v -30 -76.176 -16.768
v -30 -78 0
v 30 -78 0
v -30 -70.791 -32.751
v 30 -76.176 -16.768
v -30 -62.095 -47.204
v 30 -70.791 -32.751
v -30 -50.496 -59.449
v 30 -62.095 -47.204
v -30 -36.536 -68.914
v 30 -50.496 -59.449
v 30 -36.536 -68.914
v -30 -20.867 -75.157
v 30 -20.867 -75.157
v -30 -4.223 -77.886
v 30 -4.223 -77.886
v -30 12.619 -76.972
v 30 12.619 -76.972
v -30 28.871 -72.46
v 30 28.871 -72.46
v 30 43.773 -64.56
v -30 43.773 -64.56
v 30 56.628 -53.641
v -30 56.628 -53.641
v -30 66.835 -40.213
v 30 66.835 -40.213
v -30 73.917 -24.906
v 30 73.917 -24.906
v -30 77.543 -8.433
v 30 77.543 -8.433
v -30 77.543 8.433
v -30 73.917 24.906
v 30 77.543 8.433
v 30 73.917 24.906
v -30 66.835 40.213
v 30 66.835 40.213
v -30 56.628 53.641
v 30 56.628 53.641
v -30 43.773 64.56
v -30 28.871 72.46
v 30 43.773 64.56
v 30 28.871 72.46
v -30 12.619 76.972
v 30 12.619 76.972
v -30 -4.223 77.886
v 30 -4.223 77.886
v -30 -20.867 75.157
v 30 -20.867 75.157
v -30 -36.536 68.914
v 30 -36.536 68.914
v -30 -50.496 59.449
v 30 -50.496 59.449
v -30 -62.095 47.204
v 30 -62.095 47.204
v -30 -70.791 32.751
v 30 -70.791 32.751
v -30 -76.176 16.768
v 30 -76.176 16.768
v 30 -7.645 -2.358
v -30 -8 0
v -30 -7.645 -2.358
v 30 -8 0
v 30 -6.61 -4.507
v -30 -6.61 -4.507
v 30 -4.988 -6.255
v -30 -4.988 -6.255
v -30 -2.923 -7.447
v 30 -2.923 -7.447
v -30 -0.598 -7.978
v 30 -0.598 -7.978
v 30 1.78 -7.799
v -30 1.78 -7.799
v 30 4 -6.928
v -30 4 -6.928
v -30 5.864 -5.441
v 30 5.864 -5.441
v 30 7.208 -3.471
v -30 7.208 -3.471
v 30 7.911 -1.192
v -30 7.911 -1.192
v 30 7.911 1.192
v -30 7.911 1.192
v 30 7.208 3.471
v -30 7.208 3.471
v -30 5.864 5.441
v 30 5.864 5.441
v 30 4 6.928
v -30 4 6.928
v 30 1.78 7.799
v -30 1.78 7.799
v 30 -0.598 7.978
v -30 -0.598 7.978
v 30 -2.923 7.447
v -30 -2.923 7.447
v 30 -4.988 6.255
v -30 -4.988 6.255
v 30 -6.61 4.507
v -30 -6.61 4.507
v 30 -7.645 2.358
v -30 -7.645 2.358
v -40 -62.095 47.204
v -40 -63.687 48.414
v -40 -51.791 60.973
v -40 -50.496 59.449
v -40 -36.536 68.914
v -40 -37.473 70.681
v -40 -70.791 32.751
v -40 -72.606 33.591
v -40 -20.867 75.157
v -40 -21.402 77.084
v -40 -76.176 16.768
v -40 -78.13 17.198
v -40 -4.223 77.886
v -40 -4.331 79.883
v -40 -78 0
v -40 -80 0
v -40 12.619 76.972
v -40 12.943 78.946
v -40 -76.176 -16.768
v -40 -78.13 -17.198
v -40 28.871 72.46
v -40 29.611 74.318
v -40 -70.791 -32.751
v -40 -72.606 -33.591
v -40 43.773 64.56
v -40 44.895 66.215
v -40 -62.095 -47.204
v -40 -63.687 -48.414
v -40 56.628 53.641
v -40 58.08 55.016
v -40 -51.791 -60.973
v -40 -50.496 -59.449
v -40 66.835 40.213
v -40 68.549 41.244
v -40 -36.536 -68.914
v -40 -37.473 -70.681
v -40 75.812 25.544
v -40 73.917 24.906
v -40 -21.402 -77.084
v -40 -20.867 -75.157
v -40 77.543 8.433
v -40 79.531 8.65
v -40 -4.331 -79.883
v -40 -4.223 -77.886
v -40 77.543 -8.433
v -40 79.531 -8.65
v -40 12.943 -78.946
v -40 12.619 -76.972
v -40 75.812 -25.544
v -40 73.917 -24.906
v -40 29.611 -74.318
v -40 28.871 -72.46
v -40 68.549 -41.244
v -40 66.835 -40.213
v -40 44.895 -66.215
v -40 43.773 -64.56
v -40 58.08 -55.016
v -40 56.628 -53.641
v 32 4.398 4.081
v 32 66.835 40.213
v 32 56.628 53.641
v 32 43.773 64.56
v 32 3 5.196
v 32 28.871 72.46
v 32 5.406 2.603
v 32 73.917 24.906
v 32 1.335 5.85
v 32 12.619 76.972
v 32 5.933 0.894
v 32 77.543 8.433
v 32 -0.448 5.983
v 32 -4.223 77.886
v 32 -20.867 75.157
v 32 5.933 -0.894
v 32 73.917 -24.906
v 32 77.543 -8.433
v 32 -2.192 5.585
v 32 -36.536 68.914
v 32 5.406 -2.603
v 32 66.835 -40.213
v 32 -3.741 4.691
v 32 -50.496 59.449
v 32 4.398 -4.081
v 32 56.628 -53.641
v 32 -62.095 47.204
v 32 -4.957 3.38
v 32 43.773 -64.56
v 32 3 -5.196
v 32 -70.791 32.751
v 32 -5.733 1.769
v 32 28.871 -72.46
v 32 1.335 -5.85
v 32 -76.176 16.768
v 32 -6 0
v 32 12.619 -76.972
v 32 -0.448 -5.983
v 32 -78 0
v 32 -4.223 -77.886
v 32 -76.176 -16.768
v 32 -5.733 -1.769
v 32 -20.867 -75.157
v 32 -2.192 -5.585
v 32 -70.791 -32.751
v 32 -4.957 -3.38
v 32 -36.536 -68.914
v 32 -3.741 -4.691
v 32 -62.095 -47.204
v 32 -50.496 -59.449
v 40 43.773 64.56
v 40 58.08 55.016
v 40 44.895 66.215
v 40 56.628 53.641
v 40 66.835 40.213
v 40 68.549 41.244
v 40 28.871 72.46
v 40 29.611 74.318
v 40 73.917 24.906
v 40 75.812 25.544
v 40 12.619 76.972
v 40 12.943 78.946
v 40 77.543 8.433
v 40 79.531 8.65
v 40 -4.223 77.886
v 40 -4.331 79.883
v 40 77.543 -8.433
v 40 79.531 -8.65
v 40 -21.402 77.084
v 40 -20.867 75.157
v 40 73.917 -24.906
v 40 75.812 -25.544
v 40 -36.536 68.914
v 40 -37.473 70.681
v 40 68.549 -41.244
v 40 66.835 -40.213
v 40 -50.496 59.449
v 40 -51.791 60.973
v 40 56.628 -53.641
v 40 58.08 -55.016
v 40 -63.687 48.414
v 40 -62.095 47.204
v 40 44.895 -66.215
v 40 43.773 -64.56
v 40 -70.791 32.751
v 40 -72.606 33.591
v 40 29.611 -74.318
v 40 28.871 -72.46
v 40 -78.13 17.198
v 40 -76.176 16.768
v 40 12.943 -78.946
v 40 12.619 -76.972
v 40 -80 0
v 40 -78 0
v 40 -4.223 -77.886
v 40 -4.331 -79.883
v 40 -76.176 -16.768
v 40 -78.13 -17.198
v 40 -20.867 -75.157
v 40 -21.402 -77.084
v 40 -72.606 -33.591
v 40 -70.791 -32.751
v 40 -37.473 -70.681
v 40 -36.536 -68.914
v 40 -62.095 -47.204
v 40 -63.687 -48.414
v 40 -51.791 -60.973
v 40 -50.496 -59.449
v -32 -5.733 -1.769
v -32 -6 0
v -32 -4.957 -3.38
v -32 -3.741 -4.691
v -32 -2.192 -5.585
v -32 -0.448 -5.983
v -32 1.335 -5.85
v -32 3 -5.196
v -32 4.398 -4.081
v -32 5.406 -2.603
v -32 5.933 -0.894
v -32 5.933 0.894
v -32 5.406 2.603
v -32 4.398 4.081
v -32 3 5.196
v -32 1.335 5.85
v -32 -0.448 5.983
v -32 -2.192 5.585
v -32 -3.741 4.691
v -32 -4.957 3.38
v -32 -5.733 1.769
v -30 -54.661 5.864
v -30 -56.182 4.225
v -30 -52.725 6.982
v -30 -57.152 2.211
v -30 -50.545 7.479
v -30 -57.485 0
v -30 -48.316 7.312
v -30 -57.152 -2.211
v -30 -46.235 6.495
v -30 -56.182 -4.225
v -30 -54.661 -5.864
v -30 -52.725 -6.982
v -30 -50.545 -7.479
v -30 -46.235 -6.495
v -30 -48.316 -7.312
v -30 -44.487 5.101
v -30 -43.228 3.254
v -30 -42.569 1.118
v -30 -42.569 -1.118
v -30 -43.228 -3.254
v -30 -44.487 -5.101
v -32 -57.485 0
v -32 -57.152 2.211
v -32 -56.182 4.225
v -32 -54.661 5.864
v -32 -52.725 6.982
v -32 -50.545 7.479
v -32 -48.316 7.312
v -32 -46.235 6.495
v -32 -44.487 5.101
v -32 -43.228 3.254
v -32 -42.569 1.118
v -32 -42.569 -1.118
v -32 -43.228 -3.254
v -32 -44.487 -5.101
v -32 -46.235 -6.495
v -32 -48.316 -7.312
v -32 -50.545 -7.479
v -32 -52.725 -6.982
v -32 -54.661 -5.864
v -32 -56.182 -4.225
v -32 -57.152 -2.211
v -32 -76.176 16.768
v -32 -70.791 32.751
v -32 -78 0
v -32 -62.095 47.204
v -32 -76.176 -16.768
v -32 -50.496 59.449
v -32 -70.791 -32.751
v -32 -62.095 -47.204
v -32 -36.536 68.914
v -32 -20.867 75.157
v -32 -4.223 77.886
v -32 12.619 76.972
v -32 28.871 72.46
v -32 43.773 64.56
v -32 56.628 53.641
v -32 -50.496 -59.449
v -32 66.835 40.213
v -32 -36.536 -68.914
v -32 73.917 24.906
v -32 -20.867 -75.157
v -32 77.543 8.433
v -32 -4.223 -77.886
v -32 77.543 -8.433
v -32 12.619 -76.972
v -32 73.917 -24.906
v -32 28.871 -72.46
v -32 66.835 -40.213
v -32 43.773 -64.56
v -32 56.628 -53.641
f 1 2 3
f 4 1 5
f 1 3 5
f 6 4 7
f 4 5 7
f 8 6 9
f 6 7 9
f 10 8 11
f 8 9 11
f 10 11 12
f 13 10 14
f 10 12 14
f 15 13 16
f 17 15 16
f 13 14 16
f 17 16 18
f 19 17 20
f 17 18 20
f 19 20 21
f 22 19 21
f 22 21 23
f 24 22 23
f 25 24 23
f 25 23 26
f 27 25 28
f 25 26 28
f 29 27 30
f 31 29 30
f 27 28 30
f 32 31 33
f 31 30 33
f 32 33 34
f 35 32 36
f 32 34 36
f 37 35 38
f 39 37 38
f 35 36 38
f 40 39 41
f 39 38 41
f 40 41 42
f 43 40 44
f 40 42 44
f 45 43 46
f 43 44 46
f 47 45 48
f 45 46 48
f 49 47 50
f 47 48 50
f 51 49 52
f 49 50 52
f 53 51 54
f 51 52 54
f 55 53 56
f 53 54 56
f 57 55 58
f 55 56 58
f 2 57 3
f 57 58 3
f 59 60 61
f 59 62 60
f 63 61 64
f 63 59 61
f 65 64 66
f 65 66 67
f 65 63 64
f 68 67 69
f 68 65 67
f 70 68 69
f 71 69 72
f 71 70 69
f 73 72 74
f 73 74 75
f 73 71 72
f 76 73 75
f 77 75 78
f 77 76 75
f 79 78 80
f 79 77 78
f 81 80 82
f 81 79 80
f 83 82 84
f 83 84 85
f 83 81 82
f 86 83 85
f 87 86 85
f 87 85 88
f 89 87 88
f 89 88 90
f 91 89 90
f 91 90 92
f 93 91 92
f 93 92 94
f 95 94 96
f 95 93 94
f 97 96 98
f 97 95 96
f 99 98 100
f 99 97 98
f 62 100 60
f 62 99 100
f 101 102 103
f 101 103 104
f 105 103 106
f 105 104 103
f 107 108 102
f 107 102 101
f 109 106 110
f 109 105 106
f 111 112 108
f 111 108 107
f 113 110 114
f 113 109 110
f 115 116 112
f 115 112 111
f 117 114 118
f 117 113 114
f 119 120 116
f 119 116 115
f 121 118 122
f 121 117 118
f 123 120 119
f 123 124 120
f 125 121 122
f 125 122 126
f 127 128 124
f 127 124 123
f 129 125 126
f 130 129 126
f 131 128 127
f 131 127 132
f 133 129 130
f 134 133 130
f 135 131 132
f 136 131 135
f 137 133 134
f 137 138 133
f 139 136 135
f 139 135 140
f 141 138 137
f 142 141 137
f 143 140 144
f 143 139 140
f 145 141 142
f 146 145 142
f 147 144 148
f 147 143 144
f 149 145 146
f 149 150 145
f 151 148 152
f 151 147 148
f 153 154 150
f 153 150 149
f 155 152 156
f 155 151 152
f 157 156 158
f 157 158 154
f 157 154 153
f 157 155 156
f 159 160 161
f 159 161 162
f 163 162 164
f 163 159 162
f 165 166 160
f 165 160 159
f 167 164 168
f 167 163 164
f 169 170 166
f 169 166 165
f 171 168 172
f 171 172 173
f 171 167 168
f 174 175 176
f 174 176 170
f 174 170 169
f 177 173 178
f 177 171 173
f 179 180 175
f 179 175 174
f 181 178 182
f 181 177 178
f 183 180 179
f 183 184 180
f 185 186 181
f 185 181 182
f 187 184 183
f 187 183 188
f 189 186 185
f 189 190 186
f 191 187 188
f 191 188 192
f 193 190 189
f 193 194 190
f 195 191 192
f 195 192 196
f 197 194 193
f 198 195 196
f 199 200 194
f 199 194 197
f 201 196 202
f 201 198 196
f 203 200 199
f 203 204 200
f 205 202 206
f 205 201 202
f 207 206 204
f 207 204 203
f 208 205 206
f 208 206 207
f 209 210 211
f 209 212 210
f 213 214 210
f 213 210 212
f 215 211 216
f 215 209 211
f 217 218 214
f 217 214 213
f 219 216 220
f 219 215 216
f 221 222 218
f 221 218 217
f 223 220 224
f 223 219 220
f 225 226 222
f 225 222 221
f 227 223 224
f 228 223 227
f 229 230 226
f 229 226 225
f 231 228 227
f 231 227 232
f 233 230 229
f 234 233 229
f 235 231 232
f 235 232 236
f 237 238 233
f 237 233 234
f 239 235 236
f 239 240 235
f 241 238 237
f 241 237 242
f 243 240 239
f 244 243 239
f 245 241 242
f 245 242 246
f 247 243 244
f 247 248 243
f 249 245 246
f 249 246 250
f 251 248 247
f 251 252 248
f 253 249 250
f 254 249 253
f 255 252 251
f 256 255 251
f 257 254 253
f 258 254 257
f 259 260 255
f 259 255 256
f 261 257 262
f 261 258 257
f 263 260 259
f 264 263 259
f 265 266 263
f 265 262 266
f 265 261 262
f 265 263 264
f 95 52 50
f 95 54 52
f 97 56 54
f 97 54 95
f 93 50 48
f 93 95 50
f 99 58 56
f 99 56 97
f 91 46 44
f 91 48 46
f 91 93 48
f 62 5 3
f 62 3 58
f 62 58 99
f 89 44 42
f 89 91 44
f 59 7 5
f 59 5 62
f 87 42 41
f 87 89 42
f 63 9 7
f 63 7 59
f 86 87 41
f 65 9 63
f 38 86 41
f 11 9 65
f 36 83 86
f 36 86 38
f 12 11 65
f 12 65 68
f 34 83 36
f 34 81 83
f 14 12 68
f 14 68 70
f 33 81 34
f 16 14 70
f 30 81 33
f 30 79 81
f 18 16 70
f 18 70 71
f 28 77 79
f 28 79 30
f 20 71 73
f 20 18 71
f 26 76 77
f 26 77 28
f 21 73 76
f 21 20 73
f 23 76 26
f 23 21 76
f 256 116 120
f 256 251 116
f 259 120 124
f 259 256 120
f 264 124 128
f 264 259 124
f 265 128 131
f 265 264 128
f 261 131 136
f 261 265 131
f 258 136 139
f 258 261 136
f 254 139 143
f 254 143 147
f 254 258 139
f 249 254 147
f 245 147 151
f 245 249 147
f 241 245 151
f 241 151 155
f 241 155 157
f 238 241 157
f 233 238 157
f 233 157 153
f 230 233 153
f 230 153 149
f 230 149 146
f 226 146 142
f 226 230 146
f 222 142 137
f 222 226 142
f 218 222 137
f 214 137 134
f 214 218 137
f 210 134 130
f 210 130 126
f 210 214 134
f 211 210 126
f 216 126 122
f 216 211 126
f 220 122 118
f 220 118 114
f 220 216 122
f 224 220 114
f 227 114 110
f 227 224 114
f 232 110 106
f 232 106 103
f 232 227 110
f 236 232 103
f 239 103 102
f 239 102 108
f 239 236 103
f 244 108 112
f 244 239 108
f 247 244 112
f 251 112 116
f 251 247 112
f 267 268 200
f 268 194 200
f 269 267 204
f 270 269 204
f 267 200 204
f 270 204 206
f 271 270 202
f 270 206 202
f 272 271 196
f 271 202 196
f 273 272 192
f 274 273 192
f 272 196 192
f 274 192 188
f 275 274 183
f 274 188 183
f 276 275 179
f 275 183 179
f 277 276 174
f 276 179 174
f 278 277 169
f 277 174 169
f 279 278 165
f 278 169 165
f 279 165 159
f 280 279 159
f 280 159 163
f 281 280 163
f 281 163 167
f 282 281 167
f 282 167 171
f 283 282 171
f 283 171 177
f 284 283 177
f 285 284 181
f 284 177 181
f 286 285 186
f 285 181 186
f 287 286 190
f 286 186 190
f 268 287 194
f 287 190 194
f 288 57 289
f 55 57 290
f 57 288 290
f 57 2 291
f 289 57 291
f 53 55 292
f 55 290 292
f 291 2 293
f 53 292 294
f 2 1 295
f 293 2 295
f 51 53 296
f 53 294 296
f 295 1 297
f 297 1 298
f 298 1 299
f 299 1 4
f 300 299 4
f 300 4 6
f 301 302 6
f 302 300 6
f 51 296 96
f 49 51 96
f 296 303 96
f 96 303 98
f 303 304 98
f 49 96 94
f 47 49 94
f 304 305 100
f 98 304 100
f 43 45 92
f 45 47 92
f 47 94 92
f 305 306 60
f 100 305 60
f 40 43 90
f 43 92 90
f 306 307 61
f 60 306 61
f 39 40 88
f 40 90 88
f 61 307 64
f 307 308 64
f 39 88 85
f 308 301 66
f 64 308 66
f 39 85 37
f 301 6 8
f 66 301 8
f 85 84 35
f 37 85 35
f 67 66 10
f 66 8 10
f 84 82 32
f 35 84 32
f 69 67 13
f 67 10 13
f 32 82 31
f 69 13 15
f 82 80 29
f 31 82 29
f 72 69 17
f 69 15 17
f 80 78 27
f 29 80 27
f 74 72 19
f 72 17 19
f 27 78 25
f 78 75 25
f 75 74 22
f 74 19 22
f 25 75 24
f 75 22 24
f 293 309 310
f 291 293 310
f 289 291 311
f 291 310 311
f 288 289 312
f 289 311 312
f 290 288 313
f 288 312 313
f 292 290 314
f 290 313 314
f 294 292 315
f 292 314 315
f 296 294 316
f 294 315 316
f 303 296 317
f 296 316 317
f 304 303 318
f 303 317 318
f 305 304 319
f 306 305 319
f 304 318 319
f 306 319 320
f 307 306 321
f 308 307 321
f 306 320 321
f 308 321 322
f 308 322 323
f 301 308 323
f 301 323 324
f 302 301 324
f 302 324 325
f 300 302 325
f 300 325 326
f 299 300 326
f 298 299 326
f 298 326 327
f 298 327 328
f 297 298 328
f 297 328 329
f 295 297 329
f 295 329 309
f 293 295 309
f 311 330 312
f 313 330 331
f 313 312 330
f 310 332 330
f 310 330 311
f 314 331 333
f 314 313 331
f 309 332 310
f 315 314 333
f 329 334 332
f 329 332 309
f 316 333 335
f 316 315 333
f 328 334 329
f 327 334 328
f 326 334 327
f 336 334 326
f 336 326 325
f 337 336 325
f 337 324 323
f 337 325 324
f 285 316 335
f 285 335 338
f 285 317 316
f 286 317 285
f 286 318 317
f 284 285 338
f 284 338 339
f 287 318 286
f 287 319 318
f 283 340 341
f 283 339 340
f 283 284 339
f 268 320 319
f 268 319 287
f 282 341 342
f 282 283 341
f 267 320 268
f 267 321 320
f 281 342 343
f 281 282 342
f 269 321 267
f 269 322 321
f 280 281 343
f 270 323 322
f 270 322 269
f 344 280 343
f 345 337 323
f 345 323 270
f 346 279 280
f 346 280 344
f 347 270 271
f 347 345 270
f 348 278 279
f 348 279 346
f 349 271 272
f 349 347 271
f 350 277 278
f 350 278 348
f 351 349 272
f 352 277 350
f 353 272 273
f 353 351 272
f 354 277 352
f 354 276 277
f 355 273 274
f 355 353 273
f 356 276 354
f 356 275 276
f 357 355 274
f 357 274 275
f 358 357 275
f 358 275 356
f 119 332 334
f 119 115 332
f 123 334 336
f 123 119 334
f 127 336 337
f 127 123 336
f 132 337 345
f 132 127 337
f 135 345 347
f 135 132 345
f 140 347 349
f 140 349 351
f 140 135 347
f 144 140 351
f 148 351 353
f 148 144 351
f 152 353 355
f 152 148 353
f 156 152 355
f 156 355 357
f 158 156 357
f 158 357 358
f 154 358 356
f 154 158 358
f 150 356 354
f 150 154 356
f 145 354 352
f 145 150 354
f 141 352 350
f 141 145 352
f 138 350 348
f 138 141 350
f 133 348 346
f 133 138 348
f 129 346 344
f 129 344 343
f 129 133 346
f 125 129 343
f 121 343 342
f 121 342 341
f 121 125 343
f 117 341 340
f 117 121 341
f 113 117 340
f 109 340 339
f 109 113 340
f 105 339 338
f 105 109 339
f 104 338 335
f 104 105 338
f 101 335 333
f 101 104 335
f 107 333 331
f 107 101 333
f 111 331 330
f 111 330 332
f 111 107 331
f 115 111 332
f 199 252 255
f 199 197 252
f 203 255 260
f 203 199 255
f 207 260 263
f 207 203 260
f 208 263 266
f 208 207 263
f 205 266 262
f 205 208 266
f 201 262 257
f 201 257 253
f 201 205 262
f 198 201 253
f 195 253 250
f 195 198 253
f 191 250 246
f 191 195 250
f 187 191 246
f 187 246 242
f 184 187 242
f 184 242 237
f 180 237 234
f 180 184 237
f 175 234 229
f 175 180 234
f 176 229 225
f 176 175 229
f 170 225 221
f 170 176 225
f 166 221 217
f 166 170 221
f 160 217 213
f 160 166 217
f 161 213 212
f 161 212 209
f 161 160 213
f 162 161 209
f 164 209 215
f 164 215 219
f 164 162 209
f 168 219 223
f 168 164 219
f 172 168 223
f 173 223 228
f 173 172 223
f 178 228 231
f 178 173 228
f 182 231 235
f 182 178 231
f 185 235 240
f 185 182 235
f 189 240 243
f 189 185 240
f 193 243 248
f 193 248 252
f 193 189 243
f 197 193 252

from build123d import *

# Parameters (mm, degrees)
SKETCH_1_W          = 60
SKETCH_1_H          = 70
SKETCH_3_R          = 7.5
CUT_EXTRUDE_1_DEPTH = 17


with BuildPart() as part:
    # Эскиз1 → Повернуть1 (revolve)
    with BuildSketch(Plane.XY, mode=Mode.PRIVATE) as revolve_1_sk:
        Polygon((-40, 80), (40, 80), (40, 78), (32, 78), (32, 6), (30, 6), (-30, 6), (-32, 6), (-32, 78), (-40, 78), align=None)
        with Locations((0, 43)):
            Rectangle(SKETCH_1_W, SKETCH_1_H, mode=Mode.SUBTRACT)
    revolve(revolve_1_sk.sketch.rotate(Axis((-118.179588976, 0, 0), (1, 0, 0)), 180), axis=Axis((-118.179588976, 0, 0), (1, 0, 0)))

    # Эскиз3 → Вырез-Вытянуть1 (cut)
    with BuildSketch(Plane.ZY.offset(32)):
        with Locations(Location((0, -49.984788399, 0), (0, 0, 270))):
            Circle(SKETCH_3_R)
    extrude(amount=-CUT_EXTRUDE_1_DEPTH, mode=Mode.SUBTRACT)


solid = part.part
